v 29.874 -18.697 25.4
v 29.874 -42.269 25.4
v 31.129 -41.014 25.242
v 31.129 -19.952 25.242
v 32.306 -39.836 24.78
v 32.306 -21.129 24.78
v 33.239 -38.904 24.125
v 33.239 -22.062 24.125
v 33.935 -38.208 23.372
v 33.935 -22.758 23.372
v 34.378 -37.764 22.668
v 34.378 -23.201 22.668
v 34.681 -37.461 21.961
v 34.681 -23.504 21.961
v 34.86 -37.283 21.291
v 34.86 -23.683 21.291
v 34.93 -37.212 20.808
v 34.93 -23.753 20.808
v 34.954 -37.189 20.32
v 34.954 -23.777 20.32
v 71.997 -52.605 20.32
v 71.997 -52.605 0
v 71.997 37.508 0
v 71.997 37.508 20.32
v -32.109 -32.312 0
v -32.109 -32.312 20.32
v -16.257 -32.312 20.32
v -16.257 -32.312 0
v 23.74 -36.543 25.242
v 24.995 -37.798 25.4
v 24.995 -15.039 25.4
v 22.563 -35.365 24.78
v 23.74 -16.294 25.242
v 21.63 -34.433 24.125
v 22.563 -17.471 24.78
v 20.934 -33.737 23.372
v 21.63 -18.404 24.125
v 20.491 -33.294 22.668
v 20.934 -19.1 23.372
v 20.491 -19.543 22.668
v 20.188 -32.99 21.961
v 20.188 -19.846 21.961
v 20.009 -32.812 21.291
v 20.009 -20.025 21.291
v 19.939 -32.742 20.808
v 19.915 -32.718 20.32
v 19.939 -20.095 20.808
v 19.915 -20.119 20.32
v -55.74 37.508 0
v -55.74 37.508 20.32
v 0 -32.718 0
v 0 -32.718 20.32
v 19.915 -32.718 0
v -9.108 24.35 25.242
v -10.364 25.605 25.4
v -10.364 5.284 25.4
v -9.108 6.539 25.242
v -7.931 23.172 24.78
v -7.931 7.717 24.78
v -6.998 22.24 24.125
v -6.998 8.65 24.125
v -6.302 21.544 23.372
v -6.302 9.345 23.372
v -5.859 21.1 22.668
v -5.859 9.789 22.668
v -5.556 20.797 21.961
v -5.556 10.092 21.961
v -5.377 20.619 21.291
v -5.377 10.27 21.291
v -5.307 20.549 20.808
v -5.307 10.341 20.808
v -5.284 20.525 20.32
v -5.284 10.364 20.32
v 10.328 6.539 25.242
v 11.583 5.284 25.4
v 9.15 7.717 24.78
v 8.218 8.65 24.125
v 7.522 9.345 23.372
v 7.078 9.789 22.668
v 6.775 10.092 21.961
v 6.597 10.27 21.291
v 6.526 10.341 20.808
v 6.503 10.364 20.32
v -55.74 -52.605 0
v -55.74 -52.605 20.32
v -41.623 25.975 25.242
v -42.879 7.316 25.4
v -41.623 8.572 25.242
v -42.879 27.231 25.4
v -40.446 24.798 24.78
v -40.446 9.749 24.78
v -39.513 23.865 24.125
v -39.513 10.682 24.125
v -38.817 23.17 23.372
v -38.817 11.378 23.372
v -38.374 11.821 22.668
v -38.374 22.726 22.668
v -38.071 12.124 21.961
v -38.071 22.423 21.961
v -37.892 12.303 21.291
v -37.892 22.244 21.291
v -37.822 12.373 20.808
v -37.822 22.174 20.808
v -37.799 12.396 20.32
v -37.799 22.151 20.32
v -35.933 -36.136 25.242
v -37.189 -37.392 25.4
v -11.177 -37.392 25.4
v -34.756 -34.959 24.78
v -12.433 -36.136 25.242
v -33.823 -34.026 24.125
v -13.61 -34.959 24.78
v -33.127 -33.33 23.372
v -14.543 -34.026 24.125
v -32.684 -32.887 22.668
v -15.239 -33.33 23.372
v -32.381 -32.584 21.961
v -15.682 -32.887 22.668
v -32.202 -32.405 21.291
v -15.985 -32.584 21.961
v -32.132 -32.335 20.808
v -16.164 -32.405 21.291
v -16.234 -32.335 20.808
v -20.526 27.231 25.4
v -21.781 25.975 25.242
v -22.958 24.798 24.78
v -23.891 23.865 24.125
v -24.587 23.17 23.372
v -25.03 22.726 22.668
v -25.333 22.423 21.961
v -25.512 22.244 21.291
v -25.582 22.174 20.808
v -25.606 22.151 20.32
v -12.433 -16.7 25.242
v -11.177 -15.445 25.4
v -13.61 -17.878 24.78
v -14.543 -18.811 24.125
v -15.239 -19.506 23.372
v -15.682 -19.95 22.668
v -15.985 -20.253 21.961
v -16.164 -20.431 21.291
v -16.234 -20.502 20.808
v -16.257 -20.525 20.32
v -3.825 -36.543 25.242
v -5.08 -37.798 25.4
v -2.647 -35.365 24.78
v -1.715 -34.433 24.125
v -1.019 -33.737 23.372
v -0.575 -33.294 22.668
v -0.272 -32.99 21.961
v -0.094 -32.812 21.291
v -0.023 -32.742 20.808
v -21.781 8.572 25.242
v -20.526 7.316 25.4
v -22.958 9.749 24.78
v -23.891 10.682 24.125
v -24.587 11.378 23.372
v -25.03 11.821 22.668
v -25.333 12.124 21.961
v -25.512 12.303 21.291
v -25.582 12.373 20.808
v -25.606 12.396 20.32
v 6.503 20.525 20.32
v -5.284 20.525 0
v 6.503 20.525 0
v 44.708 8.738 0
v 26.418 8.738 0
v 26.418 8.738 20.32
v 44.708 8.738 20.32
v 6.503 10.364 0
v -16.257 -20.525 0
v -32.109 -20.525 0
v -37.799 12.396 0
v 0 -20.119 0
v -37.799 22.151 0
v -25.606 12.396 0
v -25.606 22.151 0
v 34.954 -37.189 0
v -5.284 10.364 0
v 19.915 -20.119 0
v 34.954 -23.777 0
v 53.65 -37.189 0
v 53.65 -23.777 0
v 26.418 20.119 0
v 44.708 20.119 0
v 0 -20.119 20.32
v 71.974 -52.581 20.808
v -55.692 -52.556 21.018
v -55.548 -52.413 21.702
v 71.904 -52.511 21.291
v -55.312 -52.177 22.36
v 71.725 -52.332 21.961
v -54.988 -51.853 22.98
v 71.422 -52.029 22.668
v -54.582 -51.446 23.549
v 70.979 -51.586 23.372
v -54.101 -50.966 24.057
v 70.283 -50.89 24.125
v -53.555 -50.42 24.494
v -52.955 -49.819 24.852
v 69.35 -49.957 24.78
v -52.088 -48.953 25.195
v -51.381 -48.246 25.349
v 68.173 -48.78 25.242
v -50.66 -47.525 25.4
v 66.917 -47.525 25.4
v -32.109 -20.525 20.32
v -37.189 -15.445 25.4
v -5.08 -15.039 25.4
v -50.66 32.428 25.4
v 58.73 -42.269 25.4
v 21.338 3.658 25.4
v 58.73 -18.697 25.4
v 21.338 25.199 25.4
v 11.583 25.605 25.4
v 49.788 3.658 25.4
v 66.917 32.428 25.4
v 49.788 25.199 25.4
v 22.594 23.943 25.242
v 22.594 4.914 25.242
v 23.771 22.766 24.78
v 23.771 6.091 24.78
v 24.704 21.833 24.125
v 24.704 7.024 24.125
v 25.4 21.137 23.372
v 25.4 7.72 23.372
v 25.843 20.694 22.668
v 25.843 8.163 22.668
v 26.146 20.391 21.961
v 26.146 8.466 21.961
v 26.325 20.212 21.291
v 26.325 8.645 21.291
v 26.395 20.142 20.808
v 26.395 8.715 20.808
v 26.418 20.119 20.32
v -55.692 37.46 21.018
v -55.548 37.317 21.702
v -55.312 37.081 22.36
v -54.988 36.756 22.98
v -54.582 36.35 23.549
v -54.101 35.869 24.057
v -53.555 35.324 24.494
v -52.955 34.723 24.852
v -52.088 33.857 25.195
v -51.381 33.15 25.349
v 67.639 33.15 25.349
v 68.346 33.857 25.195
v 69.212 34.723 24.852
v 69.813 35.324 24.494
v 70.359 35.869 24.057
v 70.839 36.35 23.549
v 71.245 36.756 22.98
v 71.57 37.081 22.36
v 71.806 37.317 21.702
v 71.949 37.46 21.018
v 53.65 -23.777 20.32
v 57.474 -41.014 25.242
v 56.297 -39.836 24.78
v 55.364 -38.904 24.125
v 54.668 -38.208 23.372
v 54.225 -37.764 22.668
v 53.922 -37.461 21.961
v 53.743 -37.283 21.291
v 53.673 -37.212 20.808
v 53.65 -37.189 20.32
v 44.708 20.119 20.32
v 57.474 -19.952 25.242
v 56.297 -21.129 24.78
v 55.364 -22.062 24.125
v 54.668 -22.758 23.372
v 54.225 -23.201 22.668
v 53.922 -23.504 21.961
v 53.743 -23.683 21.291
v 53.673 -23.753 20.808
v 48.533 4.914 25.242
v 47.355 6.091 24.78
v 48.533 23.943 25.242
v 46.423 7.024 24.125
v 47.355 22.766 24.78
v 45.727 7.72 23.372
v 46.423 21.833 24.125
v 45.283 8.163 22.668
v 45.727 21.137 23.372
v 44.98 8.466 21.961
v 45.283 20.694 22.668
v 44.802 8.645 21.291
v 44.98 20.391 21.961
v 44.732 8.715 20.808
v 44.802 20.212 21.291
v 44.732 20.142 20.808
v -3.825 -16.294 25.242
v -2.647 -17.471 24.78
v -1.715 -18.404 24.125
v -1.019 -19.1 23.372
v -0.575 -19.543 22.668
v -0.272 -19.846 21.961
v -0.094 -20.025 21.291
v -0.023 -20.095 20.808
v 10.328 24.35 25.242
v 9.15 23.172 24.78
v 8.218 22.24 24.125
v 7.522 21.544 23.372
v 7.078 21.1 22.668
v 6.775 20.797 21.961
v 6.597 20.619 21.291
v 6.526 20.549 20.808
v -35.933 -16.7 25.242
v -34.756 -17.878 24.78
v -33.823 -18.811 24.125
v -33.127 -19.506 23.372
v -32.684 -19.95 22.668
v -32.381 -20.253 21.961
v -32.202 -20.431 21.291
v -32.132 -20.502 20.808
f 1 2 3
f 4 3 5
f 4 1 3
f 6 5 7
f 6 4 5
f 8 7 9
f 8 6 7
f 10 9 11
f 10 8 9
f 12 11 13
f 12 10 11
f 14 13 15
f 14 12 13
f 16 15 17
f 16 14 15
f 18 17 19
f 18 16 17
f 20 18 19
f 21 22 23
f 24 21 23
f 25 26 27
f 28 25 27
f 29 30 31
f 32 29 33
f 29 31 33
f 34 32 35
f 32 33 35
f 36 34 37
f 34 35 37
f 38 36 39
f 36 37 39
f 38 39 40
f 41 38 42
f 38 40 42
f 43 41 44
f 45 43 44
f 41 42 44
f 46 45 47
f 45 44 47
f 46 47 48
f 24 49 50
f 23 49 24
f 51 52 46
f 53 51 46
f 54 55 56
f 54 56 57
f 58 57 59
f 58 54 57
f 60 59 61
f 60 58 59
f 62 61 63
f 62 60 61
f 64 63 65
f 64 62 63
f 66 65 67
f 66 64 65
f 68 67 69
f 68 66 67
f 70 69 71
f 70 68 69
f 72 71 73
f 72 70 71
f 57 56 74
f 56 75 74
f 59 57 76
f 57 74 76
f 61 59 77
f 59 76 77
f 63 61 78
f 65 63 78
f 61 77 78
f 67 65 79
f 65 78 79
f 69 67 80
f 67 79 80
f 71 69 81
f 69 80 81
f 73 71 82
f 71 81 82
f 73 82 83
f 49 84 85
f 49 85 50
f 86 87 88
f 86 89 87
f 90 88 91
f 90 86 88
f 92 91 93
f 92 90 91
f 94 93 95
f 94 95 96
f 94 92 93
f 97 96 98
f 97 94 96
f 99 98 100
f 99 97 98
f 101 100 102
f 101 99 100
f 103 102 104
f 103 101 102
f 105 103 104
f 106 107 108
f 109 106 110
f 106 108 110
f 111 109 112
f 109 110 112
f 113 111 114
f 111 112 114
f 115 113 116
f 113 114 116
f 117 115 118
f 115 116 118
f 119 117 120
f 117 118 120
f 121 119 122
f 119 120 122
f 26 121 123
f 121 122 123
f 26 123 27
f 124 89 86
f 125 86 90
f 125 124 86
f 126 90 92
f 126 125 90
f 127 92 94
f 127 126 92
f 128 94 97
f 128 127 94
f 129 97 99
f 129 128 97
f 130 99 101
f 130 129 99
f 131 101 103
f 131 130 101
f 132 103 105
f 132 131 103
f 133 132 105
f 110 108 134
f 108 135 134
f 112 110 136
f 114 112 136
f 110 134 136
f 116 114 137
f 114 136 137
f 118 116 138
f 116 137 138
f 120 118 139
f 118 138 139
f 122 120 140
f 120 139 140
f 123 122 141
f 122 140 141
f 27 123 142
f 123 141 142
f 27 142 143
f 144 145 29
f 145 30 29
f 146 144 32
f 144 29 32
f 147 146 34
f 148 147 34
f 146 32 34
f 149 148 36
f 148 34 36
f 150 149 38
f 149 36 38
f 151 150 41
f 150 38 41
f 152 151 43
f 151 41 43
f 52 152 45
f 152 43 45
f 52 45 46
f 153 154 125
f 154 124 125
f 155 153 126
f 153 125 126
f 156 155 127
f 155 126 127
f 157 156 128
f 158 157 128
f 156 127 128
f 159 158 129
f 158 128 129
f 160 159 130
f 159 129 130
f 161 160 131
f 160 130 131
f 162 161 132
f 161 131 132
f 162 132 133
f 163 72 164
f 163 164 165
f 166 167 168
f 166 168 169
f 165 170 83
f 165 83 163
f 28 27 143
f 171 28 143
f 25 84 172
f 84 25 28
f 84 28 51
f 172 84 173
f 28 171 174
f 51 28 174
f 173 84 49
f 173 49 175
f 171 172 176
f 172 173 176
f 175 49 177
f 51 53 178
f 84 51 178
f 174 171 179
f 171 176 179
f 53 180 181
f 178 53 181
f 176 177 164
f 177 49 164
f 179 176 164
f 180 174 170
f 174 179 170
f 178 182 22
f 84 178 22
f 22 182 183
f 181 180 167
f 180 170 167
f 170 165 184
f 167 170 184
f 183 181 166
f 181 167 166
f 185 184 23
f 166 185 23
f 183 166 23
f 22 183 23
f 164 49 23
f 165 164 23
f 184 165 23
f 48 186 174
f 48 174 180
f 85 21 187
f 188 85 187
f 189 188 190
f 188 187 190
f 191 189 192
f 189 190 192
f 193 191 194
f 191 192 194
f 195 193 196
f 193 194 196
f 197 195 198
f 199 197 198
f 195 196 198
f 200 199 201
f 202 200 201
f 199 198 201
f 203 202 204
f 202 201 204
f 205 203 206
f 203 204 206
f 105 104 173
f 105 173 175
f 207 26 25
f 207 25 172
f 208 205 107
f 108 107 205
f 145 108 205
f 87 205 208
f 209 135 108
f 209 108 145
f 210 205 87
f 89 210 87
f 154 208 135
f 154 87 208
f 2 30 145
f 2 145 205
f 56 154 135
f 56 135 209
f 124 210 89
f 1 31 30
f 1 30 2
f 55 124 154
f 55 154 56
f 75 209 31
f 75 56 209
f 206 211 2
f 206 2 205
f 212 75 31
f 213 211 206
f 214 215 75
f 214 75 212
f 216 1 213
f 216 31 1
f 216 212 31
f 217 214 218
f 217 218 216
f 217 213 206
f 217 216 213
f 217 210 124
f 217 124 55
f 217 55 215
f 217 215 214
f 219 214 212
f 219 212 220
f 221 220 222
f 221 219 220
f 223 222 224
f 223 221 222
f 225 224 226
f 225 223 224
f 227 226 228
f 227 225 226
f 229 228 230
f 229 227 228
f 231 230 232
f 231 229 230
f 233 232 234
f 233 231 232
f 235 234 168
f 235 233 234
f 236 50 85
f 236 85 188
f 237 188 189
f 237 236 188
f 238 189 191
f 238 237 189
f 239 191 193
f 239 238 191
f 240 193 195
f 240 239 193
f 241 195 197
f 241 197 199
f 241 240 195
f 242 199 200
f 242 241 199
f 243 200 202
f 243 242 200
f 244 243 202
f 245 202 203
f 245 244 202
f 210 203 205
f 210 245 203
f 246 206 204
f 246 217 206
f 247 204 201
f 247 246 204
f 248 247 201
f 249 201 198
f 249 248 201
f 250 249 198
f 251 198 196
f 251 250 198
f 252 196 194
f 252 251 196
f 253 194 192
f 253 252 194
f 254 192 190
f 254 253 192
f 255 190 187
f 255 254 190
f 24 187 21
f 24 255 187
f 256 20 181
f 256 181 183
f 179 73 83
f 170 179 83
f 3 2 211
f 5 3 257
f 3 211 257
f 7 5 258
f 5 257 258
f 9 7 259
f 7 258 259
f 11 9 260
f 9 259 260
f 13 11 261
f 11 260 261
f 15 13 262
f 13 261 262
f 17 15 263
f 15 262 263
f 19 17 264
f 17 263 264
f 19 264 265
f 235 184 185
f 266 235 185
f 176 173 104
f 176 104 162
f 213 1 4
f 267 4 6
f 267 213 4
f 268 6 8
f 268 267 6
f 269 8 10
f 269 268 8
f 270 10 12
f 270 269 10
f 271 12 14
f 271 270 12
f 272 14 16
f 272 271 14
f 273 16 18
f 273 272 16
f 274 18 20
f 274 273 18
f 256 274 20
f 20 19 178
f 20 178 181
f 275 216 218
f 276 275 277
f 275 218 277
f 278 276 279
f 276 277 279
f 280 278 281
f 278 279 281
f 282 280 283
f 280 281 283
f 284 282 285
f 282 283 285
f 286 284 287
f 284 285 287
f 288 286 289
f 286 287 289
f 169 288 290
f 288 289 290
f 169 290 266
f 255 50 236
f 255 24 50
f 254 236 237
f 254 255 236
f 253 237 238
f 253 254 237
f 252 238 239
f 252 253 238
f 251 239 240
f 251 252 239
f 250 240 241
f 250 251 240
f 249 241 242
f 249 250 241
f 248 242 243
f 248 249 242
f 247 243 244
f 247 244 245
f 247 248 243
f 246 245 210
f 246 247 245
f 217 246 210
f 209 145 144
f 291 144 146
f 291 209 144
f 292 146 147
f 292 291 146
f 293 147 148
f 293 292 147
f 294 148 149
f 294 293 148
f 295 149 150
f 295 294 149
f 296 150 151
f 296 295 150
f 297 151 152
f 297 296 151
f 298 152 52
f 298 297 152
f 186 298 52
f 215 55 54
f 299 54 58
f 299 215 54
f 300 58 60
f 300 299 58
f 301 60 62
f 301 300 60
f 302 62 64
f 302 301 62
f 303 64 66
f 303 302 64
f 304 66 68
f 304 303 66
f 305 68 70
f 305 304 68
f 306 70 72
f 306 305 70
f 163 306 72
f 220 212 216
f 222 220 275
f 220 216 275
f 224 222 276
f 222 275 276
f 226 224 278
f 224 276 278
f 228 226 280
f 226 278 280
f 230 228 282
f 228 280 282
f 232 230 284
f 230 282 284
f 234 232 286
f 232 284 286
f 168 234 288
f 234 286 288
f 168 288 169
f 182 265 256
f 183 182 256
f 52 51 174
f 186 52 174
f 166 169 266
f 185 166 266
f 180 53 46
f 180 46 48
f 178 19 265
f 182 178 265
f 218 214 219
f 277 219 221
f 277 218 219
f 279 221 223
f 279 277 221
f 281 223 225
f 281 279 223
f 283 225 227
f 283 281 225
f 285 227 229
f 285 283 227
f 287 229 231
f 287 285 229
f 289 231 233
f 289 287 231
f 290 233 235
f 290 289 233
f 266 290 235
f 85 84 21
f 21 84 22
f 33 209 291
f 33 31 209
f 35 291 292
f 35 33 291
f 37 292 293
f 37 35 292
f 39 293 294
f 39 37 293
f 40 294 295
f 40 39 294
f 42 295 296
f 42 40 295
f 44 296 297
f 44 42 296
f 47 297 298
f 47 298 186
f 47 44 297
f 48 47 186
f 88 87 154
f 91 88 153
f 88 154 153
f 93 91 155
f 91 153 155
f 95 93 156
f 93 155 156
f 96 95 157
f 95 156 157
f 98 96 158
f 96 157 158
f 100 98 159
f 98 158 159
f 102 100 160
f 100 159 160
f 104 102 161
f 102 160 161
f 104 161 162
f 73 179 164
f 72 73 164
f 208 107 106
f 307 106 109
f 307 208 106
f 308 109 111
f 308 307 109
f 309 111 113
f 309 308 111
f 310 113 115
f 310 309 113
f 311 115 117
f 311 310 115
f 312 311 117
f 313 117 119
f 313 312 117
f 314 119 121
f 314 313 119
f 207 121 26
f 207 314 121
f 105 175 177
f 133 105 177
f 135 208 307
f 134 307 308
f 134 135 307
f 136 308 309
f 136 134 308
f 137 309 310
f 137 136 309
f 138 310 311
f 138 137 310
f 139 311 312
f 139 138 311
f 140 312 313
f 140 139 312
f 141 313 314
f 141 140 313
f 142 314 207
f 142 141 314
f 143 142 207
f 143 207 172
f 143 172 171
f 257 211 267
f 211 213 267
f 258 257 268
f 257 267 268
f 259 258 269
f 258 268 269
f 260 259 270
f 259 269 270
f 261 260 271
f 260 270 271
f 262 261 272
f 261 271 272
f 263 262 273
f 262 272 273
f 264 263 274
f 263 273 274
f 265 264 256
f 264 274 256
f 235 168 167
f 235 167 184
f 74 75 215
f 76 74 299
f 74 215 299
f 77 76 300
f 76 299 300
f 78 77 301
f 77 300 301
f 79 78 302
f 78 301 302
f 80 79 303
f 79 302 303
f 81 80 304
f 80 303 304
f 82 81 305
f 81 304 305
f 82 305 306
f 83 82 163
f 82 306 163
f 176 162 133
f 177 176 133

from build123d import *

# Parameters (mm, degrees)
F0_W     = 127.737302
F0_H     = 90.112857
F1_DEPTH = 25.4
F2_W     = 11.786669
F2_H     = 10.160922
F2_W_2   = 18.289661
F2_H_2   = 11.380233
F2_W_3   = 15.851038
F2_H_3   = 11.786668
F2_W_4   = 19.915408
F2_H_4   = 12.599544
F2_W_5   = 18.696092
F2_H_5   = 13.412416
F2_W_6   = 12.193104
F2_H_6   = 9.754487
F3_DEPTH = 25.4
F4_R     = 5.08


with BuildPart() as f1:
    # F0 (on Top) → F1 (new body)
    with BuildSketch(Plane.XY):
        with Locations((8.128738, -7.548112)):
            Rectangle(F0_W, F0_H)
    extrude(amount=F1_DEPTH)

    # F2 (on face) → F3 (cut)
    with BuildSketch(Plane.XY.offset(25.4)):
        with Locations((0.609656, 15.444601)):
            Rectangle(F2_W, F2_H)
        with Locations((35.563227, 14.42851)):
            Rectangle(F2_W_2, F2_H_2)
        with Locations((-24.182993, -26.418396)):
            Rectangle(F2_W_3, F2_H_3)
        with Locations((9.957704, -26.418398)):
            Rectangle(F2_W_4, F2_H_4)
        with Locations((44.301618, -30.482765)):
            Rectangle(F2_W_5, F2_H_5)
        with Locations((-31.702076, 17.273567)):
            Rectangle(F2_W_6, F2_H_6)
    extrude(amount=-F3_DEPTH, mode=Mode.SUBTRACT)

    # F4
    f4_edges = [f1.edges().sort_by_distance(p)[0] for p in [
        (-31.702076, 22.150811, 25.4),
        (-37.798628, 17.273568, 25.4),
        (-31.702076, 12.396324, 25.4),
        (-25.605524, 17.273568, 25.4),
        (0.609656, 20.525062, 25.4),
        (6.502991, 15.444601, 25.4),
        (0.609656, 10.36414, 25.4),
        (-5.283678, 15.444601, 25.4),
        (35.563228, 20.118626, 25.4),
        (35.563228, 8.738393, 25.4),
        (26.418397, 14.428509, 25.4),
        (44.708058, 14.428509, 25.4),
        (19.915408, -26.418398, 25.4),
        (9.957704, -32.71817, 25.4),
        (0, -26.418398, 25.4),
        (9.957704, -20.118626, 25.4),
        (34.953572, -30.482765, 25.4),
        (44.301618, -23.776557, 25.4),
        (53.649664, -30.482765, 25.4),
        (44.301618, -37.188973, 25.4),
        (-32.108512, -26.418396, 25.4),
        (-24.182993, -20.525062, 25.4),
        (-24.182993, -32.31173, 25.4),
        (-16.257474, -26.418396, 25.4),
        (8.128738, 37.508316, 25.4),
        (71.997389, -7.548112, 25.4),
        (8.128738, -52.604541, 25.4),
        (-55.739913, -7.548112, 25.4),
    ]]
    fillet(f4_edges, radius=F4_R)


solid = f1.part
